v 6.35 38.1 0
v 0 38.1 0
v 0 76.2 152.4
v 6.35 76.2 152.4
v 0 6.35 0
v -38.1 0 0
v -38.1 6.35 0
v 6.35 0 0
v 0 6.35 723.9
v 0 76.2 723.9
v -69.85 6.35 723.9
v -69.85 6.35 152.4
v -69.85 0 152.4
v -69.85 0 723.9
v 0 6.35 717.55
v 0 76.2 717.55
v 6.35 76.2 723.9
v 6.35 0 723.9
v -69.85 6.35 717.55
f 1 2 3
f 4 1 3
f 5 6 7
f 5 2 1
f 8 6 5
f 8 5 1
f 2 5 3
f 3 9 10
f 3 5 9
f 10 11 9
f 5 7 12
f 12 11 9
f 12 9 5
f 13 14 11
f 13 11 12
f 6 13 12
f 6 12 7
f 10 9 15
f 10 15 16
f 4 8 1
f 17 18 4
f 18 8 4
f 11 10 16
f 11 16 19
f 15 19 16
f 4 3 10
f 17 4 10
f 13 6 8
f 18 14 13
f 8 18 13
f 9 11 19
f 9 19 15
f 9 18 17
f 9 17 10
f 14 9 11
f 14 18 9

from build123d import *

# Parameters (mm, degrees)
F1_DEPTH = 6.35
F3_DEPTH = 6.35
F5_DEPTH = 6.35


with BuildPart() as f1:
    # F0 (on Right) → F1 (new body)
    with BuildSketch(Plane.YZ):
        Polygon((0, 723.9), (0, 0), (38.1, 0), (76.2, 152.4), (76.2, 723.9), align=None)
    extrude(amount=F1_DEPTH)

    # F2 (on Front) → F3 (join)
    with BuildSketch(Plane.XZ):
        Polygon((-38.1, 0), (6.35, 0), (6.35, 723.9), (-69.85, 723.9), (-69.85, 152.4), align=None)
    extrude(amount=-F3_DEPTH)


with BuildPart() as f5:
    # F4 (on face) → F5 (new body)
    with BuildSketch(Plane.XY.offset(723.9)):
        Polygon((0, 76.2), (-69.85, 6.35), (0, 6.35), align=None)
    extrude(amount=-F5_DEPTH)


solid = Compound([f1.part, f5.part])
